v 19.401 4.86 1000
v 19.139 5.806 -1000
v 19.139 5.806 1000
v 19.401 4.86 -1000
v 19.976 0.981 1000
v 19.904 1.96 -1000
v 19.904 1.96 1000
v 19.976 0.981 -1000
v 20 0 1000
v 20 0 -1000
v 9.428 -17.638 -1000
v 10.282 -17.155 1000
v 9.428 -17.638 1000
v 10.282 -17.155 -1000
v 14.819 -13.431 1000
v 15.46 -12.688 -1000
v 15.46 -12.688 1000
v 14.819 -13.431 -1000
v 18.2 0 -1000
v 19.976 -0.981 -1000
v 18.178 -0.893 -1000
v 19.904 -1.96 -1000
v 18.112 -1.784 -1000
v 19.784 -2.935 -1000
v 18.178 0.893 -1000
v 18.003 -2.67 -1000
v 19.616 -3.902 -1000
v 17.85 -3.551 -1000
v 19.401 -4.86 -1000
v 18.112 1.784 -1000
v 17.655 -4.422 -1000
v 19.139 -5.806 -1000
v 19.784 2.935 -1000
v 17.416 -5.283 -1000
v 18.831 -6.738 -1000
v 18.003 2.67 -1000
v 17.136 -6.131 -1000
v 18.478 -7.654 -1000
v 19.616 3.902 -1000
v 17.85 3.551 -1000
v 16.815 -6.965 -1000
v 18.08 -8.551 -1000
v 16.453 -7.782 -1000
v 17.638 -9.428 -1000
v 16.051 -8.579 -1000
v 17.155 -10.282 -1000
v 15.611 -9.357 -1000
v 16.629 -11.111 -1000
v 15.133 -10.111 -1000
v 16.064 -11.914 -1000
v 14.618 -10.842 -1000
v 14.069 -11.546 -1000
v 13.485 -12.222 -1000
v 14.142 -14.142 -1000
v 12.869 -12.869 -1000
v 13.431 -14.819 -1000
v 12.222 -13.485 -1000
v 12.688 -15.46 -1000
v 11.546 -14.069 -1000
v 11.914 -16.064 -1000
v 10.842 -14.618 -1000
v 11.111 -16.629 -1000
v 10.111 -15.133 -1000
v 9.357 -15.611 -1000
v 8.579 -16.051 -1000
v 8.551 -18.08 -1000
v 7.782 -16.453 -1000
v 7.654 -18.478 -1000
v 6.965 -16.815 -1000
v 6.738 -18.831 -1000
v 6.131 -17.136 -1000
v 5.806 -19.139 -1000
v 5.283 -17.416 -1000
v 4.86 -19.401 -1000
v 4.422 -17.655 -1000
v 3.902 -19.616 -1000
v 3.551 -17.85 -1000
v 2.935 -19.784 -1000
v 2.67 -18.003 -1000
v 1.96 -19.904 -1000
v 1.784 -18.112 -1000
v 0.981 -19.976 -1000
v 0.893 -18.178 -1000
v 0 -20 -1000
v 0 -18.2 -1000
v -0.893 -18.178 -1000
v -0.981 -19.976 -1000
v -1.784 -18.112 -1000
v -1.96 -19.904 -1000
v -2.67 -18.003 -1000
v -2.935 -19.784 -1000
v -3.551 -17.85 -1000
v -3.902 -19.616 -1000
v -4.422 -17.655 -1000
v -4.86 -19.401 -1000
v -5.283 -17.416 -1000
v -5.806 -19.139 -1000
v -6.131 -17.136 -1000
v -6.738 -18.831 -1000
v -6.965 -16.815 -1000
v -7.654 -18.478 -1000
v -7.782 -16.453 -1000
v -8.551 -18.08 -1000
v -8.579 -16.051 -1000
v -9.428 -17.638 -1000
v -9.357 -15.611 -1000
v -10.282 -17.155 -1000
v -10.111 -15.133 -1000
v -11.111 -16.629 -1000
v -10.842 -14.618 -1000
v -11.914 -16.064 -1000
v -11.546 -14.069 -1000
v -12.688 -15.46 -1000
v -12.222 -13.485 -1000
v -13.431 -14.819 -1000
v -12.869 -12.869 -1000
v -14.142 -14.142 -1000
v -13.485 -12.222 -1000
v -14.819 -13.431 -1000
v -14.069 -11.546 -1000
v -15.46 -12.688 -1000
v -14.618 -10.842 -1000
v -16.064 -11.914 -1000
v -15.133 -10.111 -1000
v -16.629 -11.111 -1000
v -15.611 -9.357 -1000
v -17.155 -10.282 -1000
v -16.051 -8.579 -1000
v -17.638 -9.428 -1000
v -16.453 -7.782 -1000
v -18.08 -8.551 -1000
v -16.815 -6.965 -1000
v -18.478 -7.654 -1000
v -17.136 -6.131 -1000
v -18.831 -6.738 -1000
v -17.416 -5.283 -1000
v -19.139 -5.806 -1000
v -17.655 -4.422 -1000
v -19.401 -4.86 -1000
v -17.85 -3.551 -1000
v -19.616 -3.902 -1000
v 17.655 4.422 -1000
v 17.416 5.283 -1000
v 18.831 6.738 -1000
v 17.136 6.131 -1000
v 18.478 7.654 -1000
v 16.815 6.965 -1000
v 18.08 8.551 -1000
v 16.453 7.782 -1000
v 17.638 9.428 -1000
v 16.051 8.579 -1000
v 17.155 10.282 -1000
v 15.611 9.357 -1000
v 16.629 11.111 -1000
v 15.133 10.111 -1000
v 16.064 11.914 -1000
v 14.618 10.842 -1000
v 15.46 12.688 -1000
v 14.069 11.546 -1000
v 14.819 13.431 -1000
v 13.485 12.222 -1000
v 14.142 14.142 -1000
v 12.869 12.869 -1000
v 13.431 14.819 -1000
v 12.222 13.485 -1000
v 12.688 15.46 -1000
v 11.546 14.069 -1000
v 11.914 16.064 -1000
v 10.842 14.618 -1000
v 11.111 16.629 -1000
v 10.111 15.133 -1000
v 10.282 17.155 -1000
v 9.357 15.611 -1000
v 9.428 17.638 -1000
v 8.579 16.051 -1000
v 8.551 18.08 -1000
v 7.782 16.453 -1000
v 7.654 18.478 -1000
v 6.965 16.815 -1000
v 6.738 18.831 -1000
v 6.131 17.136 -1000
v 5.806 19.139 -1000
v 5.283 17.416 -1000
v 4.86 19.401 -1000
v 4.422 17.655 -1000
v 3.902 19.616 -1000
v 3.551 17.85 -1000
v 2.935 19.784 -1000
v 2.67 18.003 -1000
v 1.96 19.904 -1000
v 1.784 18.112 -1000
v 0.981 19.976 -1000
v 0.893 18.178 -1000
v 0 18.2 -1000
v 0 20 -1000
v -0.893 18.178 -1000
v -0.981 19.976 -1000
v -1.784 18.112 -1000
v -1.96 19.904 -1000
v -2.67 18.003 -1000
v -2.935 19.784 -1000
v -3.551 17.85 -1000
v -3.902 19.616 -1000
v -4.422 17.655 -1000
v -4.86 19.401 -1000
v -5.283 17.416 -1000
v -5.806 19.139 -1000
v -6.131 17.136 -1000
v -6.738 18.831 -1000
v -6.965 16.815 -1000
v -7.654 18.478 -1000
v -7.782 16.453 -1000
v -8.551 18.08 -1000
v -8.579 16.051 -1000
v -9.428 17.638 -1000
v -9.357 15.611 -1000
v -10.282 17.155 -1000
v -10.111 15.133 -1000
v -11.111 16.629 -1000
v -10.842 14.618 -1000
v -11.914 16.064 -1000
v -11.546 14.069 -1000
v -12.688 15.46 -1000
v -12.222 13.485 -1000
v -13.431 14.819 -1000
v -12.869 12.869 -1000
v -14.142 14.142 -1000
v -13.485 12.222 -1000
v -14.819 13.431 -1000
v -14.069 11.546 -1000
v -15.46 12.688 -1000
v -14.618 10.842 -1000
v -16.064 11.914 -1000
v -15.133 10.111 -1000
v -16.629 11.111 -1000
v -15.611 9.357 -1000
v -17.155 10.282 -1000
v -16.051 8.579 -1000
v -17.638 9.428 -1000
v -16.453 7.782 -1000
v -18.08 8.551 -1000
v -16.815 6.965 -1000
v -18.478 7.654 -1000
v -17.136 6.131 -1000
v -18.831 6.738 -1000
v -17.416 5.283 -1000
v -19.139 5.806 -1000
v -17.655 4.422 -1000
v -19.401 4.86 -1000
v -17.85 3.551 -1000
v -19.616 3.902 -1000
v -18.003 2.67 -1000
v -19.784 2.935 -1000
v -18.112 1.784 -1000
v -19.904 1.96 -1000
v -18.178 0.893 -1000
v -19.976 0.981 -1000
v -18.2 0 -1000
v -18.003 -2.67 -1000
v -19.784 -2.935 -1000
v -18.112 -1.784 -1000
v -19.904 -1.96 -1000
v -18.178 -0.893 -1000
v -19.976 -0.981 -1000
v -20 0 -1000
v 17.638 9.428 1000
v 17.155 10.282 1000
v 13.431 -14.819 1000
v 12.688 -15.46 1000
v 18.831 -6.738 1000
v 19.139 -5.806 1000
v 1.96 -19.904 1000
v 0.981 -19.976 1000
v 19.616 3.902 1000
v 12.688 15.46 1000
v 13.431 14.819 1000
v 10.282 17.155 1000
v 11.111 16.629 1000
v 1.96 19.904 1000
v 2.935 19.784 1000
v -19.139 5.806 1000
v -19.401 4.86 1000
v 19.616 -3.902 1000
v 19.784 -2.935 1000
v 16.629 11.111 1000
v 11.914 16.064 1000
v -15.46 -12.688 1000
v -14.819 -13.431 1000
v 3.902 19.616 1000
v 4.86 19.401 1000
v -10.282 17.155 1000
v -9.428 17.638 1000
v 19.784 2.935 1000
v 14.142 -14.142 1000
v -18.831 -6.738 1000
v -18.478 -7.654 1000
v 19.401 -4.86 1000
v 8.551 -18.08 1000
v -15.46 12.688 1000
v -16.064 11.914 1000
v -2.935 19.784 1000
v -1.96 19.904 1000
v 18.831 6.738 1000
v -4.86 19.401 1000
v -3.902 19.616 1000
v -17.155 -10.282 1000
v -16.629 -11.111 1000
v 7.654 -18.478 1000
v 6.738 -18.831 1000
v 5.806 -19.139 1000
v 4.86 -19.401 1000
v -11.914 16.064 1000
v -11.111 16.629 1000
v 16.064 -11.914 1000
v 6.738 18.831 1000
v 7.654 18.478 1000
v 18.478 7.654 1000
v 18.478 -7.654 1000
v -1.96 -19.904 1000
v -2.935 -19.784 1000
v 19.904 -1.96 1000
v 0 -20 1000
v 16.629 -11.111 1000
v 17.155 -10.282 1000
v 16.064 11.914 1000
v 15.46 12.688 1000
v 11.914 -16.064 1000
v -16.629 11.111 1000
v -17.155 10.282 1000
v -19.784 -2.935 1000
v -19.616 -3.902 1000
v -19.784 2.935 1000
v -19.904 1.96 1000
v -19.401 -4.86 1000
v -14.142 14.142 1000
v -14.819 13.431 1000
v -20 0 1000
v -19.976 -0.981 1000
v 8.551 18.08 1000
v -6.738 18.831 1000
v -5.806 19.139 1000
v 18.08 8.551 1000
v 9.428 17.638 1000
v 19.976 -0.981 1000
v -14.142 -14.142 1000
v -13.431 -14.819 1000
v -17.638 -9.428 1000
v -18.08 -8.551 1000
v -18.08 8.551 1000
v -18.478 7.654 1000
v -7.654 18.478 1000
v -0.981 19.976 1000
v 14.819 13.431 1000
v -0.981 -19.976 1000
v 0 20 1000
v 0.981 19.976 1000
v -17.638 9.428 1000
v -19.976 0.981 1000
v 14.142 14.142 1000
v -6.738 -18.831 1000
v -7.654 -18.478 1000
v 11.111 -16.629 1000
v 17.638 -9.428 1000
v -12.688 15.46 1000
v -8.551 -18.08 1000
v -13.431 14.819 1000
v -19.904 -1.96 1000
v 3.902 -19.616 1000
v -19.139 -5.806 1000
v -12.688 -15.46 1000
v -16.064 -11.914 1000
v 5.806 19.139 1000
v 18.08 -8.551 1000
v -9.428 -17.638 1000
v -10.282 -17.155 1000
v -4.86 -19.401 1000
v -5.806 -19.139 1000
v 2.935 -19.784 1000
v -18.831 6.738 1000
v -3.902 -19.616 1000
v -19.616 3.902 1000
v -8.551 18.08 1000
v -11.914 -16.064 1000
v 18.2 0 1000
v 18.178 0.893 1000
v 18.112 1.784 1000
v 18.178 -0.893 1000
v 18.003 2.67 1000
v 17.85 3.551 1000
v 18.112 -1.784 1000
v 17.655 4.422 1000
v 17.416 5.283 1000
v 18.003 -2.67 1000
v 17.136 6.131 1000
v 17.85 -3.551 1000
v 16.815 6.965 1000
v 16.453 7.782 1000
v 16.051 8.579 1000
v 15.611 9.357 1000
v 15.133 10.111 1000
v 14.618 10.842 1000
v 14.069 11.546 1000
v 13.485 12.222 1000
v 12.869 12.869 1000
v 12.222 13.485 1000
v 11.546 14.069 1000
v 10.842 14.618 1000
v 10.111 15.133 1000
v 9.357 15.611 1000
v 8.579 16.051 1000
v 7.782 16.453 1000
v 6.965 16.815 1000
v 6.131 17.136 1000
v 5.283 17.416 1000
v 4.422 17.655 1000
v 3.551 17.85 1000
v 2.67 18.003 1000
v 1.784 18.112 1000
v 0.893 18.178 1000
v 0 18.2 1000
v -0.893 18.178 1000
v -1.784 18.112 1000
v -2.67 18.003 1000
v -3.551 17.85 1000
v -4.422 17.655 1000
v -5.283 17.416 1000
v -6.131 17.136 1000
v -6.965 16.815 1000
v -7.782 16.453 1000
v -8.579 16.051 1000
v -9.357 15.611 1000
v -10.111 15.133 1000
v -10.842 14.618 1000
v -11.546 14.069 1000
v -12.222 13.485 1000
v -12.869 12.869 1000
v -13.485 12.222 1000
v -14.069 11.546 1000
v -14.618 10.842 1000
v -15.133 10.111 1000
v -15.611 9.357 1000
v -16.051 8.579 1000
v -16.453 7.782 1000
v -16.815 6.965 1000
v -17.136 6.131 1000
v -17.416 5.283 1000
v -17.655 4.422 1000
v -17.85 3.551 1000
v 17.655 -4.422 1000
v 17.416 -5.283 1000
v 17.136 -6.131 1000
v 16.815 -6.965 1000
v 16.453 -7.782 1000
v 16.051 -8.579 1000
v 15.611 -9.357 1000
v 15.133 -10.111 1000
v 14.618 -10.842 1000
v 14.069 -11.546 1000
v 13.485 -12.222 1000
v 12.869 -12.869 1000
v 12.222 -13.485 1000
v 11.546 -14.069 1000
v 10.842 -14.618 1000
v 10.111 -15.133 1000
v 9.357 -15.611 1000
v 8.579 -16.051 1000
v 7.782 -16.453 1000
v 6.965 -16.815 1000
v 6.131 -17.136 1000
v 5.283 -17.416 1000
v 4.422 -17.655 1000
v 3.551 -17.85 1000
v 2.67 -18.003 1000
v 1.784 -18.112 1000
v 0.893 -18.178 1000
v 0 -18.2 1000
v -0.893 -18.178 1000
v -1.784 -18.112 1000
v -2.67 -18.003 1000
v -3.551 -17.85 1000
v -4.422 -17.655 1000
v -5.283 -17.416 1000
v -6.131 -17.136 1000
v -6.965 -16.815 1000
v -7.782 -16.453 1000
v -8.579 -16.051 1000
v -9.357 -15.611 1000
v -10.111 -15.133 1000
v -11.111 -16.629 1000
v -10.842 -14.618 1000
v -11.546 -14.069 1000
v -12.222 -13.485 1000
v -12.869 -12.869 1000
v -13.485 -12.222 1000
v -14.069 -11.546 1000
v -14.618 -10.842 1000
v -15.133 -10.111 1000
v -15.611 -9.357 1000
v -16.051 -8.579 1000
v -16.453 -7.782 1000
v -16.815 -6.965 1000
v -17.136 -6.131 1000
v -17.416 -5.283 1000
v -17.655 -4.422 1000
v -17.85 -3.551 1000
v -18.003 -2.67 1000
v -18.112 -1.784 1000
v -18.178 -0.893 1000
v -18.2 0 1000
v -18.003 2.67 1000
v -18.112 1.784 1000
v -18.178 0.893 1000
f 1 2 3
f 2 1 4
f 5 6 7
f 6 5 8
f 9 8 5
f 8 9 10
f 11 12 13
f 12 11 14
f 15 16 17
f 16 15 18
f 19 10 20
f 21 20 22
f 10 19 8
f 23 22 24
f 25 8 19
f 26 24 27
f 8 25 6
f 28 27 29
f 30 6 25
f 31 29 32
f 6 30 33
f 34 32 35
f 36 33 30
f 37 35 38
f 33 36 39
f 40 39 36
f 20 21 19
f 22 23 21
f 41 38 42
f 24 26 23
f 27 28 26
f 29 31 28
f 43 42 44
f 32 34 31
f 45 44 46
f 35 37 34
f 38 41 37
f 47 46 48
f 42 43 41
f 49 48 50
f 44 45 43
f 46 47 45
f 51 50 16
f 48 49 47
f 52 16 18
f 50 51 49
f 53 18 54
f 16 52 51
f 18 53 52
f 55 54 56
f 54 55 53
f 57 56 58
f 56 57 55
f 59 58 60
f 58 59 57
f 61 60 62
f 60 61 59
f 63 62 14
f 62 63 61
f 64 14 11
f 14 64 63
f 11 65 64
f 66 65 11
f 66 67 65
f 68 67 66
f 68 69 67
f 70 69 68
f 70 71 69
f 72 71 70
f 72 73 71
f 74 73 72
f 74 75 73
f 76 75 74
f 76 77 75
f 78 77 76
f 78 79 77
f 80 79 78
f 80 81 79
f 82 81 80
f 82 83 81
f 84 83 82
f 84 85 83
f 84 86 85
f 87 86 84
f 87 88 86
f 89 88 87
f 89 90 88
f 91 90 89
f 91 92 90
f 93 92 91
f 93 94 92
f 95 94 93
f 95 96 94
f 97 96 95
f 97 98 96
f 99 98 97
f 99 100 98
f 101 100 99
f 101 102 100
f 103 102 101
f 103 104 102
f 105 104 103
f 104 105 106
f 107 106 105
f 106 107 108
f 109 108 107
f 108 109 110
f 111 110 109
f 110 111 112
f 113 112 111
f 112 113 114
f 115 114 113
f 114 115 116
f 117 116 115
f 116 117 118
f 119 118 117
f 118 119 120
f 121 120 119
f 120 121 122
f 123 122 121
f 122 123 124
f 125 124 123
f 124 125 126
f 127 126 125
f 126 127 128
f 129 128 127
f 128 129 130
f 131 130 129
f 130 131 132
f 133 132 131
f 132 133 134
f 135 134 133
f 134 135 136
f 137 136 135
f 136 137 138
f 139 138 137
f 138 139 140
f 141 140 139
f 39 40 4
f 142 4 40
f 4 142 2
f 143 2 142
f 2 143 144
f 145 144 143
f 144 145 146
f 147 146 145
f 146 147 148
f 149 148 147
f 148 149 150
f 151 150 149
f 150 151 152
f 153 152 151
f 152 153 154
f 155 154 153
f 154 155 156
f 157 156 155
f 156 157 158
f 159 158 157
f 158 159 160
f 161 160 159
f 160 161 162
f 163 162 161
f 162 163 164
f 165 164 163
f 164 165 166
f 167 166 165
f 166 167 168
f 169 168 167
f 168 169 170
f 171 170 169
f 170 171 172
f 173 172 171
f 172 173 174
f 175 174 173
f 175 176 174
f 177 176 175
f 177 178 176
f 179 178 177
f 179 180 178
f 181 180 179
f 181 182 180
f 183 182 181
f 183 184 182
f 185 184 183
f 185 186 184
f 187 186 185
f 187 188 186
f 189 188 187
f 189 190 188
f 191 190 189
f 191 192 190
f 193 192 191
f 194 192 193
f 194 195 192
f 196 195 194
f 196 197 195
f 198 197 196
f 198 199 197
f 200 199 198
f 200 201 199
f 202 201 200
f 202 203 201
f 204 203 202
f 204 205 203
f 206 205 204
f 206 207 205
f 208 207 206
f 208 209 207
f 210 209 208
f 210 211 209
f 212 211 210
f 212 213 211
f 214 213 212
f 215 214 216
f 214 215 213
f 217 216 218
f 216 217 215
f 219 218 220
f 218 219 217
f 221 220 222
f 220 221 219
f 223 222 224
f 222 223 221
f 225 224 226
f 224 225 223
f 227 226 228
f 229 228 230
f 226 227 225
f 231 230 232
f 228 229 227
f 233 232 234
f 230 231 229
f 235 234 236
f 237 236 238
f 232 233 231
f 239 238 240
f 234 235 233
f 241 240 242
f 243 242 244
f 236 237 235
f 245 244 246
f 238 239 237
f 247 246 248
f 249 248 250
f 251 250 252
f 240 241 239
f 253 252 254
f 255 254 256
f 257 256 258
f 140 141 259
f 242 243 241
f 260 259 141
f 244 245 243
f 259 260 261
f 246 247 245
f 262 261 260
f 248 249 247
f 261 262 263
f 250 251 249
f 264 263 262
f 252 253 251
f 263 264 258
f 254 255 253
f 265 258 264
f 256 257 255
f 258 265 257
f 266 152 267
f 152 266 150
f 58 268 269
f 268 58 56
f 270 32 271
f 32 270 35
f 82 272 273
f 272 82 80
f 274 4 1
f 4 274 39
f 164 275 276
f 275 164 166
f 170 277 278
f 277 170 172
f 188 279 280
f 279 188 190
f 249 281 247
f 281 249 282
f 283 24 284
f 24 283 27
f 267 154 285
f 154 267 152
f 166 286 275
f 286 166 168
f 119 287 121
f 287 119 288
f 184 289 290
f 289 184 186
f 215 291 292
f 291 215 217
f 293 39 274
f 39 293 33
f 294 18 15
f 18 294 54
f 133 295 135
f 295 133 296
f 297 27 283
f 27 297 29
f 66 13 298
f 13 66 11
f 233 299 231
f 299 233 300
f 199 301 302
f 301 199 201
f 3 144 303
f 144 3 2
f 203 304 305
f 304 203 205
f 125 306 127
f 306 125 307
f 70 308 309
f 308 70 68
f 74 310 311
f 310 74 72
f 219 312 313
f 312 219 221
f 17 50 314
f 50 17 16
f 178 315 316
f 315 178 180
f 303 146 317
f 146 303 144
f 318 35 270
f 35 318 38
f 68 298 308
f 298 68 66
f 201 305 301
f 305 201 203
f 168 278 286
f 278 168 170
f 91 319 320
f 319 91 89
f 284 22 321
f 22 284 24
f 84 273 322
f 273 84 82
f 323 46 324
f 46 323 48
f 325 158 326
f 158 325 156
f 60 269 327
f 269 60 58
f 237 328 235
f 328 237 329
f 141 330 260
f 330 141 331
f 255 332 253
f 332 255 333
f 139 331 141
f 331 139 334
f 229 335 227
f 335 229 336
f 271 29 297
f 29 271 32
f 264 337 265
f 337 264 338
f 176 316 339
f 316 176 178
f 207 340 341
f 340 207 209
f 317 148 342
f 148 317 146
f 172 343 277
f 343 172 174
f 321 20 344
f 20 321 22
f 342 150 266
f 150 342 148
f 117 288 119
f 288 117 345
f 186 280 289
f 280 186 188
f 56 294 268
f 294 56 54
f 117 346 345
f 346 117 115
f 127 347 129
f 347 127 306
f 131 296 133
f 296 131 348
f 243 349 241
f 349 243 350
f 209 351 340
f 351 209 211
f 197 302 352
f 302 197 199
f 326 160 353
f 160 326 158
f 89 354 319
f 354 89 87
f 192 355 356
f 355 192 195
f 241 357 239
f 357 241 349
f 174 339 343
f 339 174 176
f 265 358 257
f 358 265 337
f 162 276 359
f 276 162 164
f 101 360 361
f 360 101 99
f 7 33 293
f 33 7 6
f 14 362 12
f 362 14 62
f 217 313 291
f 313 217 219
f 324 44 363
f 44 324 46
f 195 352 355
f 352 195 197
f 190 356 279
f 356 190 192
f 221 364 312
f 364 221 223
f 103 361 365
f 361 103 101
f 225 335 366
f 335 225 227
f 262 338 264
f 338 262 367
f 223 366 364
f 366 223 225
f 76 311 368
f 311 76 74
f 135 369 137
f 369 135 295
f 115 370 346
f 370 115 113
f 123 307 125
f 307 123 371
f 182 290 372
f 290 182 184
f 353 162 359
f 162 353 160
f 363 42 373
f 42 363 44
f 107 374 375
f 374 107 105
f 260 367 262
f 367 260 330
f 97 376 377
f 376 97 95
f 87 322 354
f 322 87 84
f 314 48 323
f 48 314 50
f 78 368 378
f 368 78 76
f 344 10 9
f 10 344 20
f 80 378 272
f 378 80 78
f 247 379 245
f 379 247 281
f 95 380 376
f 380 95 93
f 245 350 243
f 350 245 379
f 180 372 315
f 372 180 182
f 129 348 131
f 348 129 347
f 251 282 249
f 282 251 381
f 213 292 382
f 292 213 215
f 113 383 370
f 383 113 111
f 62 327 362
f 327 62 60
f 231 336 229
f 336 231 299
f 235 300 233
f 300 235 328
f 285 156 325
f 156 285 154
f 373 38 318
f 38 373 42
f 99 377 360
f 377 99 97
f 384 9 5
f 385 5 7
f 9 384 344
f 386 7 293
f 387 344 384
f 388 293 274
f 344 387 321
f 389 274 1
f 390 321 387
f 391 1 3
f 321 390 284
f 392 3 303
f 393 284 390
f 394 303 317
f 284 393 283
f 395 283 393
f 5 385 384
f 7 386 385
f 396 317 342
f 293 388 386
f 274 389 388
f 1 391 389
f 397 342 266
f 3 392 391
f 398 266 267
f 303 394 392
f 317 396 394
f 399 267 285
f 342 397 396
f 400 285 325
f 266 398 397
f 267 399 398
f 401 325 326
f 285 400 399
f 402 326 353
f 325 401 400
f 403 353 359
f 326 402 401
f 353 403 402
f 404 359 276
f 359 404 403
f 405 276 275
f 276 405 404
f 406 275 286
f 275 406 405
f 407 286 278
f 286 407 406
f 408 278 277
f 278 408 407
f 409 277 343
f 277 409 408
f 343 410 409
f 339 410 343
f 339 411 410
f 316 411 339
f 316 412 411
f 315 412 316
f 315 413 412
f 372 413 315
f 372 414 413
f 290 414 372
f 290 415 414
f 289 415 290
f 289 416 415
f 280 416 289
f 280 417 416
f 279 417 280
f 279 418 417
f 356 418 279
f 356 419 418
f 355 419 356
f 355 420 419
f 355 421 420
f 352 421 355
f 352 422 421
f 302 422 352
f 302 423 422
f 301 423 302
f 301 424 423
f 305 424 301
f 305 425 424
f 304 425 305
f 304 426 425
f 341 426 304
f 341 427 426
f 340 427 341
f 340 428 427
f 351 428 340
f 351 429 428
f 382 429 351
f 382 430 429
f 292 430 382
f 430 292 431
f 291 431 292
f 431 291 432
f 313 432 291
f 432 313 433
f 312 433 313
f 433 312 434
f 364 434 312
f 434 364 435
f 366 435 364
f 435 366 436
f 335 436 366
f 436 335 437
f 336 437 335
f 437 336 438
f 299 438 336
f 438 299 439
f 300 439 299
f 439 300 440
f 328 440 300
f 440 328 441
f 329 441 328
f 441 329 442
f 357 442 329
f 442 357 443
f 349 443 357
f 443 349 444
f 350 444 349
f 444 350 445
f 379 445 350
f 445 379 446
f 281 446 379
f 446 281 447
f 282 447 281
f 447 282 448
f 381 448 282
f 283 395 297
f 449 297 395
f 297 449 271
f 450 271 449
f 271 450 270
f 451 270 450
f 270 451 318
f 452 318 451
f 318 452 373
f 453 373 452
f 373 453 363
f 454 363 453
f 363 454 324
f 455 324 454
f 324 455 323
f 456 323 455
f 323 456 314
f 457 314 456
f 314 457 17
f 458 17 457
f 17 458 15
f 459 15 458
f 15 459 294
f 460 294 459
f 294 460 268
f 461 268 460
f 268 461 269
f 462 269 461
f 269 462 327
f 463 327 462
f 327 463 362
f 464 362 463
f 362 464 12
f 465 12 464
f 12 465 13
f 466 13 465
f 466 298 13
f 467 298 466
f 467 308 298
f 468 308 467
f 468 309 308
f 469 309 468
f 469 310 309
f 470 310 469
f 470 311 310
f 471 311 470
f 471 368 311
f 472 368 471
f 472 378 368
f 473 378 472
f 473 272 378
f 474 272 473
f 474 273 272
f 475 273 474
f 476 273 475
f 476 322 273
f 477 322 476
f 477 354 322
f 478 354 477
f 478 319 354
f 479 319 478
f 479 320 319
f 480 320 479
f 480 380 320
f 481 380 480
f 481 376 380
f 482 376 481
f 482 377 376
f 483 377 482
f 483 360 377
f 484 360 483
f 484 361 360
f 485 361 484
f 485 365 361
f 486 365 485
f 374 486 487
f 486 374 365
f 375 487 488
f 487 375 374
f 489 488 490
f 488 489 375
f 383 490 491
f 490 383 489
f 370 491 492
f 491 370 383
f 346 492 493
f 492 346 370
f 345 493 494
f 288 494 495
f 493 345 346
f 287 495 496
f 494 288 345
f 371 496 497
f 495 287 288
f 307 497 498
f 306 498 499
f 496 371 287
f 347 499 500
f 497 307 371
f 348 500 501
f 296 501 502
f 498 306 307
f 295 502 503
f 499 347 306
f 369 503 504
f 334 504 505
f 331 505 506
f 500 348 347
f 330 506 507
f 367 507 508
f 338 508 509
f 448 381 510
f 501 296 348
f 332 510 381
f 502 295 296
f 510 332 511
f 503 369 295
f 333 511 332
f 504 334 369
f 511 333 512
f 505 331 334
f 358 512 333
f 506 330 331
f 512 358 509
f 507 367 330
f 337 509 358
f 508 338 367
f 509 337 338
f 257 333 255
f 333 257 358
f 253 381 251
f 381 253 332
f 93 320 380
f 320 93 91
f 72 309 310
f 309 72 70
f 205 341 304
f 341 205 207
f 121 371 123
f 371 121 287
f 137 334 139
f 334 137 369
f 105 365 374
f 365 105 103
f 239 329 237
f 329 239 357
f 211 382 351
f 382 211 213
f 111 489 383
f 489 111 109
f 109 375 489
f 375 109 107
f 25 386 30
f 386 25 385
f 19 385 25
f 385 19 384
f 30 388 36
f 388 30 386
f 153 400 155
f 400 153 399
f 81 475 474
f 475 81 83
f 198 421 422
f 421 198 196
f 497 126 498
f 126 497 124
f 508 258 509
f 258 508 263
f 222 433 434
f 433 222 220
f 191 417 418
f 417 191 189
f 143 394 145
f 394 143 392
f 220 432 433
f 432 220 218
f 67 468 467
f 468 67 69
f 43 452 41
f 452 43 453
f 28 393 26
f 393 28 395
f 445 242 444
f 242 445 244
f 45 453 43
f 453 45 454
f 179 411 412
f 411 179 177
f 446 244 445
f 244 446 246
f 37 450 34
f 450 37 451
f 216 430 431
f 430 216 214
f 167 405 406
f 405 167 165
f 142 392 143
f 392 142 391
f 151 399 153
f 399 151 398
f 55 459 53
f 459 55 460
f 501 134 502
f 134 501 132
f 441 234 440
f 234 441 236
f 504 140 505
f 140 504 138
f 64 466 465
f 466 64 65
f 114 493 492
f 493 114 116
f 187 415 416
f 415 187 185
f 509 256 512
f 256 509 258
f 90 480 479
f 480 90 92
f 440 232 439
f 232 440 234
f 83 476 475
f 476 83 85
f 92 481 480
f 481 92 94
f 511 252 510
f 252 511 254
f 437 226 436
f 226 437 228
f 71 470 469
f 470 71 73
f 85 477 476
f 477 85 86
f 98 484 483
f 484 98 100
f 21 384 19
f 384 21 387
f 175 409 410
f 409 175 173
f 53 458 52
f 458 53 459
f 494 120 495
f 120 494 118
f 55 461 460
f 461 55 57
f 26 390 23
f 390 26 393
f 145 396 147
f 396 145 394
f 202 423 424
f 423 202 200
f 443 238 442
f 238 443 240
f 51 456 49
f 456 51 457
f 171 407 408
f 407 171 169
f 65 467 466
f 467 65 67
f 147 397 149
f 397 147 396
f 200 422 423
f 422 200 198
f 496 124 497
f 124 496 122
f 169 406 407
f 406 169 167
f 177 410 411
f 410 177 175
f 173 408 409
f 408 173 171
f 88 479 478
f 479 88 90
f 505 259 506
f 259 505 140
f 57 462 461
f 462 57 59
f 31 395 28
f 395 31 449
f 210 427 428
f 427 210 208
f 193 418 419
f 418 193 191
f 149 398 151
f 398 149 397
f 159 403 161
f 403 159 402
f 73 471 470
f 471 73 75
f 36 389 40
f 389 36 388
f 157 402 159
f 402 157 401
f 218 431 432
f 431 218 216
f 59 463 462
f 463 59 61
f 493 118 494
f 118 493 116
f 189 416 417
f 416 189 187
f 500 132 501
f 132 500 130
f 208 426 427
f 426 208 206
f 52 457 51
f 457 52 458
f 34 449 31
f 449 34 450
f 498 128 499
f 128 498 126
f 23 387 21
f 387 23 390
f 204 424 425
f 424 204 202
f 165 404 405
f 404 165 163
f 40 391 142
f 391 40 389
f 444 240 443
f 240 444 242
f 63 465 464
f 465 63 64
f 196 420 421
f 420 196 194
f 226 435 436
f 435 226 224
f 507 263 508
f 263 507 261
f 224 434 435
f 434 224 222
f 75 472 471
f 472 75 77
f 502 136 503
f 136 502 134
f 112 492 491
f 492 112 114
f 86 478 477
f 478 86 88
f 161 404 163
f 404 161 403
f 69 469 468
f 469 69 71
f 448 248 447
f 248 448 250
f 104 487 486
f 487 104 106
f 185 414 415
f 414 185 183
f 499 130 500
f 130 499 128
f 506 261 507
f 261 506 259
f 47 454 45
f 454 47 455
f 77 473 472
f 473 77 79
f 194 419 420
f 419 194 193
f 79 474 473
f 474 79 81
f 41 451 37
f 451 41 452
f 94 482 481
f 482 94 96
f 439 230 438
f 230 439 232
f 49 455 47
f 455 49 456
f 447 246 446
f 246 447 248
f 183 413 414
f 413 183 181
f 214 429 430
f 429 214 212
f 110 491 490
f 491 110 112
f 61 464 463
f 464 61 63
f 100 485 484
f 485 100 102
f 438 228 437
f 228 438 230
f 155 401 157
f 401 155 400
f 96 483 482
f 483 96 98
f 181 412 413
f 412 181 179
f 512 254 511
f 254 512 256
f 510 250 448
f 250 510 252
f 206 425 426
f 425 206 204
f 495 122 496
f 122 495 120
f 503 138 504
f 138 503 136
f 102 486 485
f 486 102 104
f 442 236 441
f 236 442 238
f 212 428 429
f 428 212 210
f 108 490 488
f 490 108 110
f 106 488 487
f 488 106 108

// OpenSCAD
$fn=128;

module ht_pipe(od=40, wall=1.8, length=2000) {
    difference() {
        cylinder(h=length, d=od, center=true);
        cylinder(h=length+2, d=od-2*wall, center=true);
    }
}

ht_pipe(od=40, wall=1.8, length=2000);
